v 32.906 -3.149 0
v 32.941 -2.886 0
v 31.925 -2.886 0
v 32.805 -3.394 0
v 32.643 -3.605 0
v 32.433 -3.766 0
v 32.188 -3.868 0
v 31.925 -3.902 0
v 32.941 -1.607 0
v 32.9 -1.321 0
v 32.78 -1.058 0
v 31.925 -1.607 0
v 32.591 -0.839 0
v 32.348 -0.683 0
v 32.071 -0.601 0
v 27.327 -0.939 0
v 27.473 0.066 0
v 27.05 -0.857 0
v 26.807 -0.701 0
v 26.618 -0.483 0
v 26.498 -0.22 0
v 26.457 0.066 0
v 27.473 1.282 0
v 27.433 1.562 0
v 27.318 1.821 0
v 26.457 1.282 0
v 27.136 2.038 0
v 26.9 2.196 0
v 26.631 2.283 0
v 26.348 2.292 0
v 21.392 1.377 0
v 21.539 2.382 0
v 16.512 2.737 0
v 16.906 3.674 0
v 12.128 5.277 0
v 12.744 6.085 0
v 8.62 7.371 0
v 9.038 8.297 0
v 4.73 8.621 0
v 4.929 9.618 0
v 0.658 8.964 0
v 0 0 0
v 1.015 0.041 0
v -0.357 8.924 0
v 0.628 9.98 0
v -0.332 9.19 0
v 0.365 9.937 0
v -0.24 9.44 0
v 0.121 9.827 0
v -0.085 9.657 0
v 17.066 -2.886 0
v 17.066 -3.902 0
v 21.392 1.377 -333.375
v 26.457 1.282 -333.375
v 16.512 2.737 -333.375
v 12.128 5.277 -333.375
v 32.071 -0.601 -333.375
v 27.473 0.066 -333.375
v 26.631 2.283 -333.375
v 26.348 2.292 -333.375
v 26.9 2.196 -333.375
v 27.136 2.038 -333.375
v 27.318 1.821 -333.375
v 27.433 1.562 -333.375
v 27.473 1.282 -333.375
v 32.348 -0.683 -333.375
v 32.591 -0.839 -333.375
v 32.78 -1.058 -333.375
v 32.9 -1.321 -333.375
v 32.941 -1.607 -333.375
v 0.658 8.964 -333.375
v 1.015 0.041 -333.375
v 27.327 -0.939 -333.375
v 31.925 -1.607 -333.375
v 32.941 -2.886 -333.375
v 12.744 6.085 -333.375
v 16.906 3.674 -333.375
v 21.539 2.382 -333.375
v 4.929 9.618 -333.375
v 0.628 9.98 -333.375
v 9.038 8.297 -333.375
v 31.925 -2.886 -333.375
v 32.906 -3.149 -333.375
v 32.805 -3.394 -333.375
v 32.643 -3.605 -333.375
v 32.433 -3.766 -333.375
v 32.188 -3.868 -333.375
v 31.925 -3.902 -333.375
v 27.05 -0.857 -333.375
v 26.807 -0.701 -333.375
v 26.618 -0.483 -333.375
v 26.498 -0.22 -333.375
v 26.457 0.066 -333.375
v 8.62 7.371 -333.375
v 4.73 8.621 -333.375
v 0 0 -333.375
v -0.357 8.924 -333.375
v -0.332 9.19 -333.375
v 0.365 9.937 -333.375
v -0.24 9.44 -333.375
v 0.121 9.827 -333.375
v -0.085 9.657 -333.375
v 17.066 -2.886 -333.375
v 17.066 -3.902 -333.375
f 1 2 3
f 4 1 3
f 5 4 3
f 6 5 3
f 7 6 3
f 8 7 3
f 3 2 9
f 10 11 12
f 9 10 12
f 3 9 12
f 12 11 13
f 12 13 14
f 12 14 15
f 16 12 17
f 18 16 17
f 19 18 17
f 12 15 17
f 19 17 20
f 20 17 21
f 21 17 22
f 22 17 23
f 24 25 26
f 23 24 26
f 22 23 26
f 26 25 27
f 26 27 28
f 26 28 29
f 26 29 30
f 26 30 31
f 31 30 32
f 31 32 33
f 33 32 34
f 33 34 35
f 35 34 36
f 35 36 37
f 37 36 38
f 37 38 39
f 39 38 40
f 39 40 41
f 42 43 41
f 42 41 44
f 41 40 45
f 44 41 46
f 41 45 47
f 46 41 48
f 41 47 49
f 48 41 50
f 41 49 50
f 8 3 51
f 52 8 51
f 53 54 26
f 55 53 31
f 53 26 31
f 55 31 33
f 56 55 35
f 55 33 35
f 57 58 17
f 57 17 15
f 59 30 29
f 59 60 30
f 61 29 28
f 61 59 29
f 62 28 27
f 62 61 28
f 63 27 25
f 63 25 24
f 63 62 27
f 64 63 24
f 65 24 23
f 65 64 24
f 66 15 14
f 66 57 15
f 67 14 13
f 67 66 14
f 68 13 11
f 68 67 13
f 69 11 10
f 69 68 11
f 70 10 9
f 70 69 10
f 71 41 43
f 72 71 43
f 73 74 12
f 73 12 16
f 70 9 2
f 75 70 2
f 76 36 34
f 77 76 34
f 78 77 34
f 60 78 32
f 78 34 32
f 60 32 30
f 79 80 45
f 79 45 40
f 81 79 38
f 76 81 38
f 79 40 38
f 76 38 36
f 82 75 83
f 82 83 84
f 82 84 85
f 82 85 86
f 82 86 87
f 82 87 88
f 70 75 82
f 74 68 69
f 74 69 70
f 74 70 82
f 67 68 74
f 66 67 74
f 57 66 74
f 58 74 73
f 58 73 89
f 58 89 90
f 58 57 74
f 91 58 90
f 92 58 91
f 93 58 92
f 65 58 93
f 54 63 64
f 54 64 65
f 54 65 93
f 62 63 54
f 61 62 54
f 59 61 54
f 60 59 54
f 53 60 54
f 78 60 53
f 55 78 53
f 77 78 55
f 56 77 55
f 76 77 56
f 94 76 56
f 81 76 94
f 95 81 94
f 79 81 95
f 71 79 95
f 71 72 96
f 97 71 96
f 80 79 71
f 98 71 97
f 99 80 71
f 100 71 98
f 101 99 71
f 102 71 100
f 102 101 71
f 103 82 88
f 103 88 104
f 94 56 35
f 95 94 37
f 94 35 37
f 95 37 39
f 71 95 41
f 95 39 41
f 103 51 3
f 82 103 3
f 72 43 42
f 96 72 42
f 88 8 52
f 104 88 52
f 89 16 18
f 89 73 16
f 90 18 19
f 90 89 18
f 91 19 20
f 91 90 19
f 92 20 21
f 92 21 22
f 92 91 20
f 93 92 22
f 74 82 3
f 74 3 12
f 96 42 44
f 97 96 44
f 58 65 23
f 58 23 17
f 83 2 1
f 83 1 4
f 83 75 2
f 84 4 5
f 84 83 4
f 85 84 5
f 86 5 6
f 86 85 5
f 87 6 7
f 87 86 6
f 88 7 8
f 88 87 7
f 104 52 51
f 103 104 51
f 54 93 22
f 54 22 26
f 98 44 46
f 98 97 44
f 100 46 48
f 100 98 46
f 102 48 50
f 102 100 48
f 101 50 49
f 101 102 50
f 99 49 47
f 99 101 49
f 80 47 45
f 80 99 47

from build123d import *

# Parameters (mm, degrees)
EXTRUDE_THIN1_DEPTH = 333.375
FILLET1_R           = 1.016


with BuildPart() as part:
    # Sketch1 → Extrude-Thin1 (new body)
    with BuildSketch(Plane.XY):
        with BuildLine():
            Line((0, 0), (-0.396875, 9.921875))
            ThreePointArc((-0.396875, 9.921875), (6.530313151, 9.224476066), (12.744287778, 6.084600226))
            ThreePointArc((12.744287778, 6.084600226), (19.730938199, 2.736608506), (27.472950555, 2.44751107))
            Line((27.472950555, 2.44751107), (27.472950555, 0.06626107))
            Line((27.472950555, 0.06626107), (32.940625, -0.72748893))
            Line((32.940625, -0.72748893), (32.940625, -3.90248893))
            Line((32.940625, -3.90248893), (17.065625, -3.90248893))
            Line((17.065625, -3.90248893), (17.065625, -2.88648893))
            Line((17.065625, -2.88648893), (31.924625, -2.88648893))
            Line((31.924625, -2.88648893), (31.924625, -1.606644926))
            Line((31.924625, -1.606644926), (26.456950555, -0.812894926))
            Line((26.456950555, -0.812894926), (26.456950555, 1.28155123))
            ThreePointArc((26.456950555, 1.28155123), (18.908627692, 1.902340806), (12.12809243, 5.276788804))
            ThreePointArc((12.12809243, 5.276788804), (6.71021132, 8.106692295), (0.658241432, 8.964276082))
            Line((0.658241432, 8.964276082), (1.015188174, 0.040607527))
            Line((1.015188174, 0.040607527), (0, 0))
        make_face()
    extrude(amount=-EXTRUDE_THIN1_DEPTH)

    # Fillet1
    fillet1_edges = [part.edges().sort_by_distance(p)[0] for p in [
        (26.456950555, -0.812894926, -166.6875),
        (-0.396875, 9.921875, -166.6875),
        (27.472950555, 2.44751107, -166.6875),
        (32.940625, -0.72748893, -166.6875),
        (32.940625, -3.90248893, -166.6875),
    ]]
    fillet(fillet1_edges, radius=FILLET1_R)


solid = part.part
